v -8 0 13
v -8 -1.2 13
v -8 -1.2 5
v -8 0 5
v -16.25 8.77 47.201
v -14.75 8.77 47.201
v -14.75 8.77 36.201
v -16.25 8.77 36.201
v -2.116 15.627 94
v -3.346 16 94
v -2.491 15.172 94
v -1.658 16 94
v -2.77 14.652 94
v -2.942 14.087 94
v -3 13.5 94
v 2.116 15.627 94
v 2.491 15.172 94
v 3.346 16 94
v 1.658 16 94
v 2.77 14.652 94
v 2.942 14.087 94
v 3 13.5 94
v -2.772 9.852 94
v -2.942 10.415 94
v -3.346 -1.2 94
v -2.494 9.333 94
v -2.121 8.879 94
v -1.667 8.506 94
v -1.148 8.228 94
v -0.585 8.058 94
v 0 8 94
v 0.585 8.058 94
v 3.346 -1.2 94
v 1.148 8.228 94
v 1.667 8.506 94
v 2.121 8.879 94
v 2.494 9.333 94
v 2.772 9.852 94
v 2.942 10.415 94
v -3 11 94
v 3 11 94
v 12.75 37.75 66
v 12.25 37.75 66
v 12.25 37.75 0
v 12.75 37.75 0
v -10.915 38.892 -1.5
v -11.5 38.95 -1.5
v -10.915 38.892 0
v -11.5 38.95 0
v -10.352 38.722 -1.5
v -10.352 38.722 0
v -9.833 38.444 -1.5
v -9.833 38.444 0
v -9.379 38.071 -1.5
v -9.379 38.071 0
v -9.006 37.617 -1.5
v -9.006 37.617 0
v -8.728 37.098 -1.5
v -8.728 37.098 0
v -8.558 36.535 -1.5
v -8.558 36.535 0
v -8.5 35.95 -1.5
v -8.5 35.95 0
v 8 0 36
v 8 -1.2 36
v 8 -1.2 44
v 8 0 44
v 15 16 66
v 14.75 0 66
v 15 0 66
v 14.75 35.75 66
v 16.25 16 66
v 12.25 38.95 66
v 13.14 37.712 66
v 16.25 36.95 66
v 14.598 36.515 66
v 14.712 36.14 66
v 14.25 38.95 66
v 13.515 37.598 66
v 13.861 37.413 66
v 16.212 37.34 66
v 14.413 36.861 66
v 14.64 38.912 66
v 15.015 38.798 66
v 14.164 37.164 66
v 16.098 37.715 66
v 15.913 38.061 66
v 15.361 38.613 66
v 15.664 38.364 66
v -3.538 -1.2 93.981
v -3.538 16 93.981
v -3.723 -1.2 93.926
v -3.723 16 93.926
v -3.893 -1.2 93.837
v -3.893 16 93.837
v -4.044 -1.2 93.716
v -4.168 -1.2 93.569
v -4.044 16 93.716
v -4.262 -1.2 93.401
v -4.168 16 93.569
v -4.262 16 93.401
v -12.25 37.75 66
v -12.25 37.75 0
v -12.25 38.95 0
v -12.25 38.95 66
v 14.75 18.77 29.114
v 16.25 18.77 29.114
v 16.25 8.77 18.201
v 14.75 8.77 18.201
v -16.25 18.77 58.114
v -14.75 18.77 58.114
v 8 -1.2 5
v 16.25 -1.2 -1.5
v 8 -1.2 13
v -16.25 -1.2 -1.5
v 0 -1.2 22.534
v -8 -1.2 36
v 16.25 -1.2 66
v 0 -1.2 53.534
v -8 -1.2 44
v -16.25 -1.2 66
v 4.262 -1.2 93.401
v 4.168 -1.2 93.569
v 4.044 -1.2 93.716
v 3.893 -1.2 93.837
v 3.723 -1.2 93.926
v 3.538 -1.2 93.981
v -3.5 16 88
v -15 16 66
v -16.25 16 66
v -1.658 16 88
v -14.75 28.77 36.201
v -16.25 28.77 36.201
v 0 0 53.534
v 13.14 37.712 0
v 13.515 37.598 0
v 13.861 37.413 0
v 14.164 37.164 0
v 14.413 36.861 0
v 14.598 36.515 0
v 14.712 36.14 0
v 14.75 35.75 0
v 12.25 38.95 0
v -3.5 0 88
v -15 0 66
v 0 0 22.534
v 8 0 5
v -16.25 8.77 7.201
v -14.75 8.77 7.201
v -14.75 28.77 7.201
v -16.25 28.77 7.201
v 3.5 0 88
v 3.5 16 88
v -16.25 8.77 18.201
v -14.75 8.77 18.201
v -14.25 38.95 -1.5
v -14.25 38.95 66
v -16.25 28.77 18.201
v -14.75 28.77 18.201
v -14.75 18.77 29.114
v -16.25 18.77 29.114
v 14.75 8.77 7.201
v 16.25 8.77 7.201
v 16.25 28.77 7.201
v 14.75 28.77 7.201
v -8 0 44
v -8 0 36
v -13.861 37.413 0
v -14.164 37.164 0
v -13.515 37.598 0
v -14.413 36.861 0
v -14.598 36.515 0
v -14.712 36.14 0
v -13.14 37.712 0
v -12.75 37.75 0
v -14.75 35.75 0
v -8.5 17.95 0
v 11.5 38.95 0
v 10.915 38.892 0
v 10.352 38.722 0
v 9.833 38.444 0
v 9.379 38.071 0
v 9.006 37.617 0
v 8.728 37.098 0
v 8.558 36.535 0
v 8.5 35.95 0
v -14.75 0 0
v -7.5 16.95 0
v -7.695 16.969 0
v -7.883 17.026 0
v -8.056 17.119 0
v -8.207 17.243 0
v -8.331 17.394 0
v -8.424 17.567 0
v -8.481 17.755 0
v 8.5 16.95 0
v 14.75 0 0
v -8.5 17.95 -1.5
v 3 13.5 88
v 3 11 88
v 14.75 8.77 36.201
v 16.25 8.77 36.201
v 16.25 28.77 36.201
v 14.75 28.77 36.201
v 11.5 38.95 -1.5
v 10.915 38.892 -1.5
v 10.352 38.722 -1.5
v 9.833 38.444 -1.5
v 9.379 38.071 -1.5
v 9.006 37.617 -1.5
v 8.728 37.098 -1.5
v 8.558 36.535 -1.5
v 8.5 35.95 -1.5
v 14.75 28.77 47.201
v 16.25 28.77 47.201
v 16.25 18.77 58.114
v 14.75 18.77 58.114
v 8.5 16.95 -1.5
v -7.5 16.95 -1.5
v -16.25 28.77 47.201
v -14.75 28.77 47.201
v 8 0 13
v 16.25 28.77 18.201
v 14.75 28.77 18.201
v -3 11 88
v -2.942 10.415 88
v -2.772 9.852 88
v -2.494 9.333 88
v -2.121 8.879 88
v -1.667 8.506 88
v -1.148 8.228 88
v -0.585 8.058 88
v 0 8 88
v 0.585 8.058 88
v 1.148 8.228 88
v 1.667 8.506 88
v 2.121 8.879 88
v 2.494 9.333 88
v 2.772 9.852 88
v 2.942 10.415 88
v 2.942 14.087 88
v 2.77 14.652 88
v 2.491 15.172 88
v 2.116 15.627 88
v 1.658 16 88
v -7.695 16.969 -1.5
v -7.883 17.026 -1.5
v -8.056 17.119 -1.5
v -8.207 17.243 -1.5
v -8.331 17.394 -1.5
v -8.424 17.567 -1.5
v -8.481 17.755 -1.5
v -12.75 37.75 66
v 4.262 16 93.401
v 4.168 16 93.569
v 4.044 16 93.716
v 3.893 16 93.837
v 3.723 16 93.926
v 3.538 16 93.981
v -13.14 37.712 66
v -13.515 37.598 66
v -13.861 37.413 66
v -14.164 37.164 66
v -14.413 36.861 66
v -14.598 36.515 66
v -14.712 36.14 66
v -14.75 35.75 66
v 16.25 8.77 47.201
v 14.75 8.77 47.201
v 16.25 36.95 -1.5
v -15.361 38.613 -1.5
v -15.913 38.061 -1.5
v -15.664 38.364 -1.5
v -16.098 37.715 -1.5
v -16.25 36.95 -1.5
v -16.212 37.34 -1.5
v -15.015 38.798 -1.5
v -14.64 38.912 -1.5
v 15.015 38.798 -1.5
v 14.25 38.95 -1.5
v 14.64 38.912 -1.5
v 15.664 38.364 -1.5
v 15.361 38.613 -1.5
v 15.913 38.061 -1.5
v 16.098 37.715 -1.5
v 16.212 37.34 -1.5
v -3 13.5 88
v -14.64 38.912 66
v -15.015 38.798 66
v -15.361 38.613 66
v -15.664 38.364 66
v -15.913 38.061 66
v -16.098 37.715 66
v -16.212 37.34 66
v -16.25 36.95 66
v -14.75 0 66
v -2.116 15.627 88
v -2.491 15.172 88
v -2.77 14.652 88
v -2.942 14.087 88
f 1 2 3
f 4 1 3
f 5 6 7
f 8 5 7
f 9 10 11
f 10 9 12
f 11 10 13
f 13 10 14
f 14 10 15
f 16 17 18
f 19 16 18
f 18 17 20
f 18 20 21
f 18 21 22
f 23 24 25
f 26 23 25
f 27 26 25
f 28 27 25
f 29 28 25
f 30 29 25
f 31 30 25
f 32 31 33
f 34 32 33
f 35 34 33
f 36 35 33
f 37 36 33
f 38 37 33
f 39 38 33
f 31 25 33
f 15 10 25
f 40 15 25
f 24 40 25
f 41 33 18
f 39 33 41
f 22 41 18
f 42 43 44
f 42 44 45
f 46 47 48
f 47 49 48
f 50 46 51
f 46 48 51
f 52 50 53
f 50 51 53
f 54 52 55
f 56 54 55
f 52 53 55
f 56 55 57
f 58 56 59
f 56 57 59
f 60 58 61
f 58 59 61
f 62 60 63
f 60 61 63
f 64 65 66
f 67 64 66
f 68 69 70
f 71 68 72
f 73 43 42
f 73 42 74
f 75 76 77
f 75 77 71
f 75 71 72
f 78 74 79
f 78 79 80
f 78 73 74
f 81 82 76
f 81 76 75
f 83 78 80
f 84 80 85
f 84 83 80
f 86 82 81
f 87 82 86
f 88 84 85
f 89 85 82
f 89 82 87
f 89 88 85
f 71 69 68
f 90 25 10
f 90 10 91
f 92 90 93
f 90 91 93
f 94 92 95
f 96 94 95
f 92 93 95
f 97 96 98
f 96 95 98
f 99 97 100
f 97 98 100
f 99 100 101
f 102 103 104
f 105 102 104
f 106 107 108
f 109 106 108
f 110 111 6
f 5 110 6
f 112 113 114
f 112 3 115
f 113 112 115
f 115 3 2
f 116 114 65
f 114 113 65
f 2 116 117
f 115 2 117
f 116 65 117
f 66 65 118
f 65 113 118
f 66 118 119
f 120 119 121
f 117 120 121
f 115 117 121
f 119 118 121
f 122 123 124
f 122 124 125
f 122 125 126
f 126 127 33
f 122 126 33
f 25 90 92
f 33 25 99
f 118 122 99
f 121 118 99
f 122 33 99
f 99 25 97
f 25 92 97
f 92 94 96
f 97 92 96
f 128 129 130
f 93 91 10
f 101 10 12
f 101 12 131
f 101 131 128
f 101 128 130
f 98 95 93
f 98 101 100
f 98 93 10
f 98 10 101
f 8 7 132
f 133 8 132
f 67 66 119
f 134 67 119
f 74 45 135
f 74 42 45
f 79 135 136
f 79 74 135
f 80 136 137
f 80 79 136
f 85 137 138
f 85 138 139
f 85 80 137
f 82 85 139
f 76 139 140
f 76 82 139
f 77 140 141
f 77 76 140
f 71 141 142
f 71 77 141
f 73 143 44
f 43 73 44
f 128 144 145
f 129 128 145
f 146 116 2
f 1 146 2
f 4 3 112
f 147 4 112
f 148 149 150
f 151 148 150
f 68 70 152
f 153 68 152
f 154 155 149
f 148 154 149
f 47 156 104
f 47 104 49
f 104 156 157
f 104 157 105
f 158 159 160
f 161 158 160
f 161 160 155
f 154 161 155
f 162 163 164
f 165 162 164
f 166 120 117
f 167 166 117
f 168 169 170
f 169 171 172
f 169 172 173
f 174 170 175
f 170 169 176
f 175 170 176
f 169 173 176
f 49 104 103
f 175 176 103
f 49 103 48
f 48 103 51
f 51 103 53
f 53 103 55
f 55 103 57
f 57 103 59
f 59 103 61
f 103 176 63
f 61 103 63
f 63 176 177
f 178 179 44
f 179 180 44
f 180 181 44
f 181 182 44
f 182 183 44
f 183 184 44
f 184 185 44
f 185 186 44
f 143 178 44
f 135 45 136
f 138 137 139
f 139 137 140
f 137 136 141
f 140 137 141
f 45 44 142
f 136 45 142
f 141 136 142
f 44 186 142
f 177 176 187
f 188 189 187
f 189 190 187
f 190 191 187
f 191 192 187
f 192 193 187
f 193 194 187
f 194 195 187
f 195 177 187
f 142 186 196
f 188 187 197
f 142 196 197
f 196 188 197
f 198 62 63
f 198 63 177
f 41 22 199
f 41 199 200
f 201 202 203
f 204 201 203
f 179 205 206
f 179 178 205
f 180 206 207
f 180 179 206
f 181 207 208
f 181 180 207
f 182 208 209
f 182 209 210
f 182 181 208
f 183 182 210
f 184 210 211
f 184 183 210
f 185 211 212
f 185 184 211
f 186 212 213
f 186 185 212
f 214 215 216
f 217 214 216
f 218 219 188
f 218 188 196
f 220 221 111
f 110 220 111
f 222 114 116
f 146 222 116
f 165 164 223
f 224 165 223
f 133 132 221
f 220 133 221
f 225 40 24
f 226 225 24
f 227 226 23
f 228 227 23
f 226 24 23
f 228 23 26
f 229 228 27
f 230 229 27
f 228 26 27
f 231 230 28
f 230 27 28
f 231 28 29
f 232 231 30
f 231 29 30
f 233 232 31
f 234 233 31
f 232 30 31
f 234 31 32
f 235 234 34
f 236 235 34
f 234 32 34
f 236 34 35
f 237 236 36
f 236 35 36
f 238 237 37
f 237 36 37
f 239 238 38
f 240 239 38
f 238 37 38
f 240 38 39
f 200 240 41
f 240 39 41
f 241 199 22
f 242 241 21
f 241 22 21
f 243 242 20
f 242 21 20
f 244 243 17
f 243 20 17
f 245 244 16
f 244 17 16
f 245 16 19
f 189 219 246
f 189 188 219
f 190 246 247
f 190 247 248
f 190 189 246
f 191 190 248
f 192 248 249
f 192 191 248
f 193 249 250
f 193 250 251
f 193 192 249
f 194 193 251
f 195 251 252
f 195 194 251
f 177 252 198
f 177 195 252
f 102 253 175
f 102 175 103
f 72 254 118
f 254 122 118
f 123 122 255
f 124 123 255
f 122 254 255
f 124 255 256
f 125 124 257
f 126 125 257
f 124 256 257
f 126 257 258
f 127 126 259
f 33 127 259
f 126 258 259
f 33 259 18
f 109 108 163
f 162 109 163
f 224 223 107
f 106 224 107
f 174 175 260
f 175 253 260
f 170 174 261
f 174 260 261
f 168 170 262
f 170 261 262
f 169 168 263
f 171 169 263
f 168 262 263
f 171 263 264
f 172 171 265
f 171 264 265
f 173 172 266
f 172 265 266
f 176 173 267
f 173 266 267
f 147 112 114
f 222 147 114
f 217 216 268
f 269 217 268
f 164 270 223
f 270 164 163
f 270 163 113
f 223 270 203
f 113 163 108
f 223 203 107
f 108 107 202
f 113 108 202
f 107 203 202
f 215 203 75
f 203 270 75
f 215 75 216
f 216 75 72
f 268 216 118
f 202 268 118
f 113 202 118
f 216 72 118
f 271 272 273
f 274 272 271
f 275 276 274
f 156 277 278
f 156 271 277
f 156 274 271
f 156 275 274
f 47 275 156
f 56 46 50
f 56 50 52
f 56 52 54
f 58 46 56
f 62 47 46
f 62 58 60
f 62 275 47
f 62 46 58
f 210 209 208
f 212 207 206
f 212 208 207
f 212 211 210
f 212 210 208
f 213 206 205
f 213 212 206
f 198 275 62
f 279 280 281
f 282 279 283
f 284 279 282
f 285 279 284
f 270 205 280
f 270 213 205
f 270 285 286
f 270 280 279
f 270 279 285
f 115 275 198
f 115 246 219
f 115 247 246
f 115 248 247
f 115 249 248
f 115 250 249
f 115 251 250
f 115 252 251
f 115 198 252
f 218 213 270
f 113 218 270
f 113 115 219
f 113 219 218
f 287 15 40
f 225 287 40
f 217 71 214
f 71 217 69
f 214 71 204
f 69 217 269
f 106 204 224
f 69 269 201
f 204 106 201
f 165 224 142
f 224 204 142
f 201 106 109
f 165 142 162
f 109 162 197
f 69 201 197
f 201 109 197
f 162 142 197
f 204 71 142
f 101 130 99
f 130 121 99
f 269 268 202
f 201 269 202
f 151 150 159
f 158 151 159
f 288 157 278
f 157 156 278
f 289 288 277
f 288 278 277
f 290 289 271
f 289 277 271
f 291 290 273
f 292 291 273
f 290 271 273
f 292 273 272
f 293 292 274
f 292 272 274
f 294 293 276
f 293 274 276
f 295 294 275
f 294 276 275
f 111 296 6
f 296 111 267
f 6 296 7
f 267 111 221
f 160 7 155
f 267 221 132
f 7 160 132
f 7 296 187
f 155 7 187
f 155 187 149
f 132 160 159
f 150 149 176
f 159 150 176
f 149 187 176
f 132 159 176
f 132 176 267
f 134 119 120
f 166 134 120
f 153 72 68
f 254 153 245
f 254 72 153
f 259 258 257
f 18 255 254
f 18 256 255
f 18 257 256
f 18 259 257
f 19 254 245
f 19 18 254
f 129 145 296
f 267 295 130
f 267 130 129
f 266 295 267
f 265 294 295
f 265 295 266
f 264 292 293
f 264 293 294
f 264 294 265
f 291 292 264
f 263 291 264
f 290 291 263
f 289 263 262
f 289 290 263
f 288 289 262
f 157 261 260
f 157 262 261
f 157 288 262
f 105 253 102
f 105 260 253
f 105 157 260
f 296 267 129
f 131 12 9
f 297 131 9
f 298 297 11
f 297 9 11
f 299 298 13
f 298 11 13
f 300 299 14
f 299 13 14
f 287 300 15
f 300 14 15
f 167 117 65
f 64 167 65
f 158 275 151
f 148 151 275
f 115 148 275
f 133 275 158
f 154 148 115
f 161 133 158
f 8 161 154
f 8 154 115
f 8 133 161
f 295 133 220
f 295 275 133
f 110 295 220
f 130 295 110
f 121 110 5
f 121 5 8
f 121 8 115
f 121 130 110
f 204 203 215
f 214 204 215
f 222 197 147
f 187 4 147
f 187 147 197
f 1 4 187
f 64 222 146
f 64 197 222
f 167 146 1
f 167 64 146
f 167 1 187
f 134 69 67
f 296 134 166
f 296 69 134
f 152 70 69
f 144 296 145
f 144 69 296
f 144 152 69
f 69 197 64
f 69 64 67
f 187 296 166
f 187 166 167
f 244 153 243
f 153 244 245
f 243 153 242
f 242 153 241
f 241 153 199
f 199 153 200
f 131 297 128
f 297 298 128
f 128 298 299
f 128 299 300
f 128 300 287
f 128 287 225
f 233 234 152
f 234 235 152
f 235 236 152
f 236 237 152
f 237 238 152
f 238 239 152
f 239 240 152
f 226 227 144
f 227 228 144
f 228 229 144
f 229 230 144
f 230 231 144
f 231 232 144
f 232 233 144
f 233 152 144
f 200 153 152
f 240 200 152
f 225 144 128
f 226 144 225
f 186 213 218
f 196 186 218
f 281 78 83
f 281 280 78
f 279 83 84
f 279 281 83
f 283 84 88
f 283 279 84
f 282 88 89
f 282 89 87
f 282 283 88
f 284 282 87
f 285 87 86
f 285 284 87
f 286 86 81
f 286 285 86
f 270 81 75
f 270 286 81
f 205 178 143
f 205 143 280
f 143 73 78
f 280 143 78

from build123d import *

# Parameters (mm, degrees)
PAD_DEPTH              = 66
SKETCH001_W            = 32.5
SKETCH001_H            = 40.15
PAD001_DEPTH           = 1.5
PAD002_DEPTH           = 1.2
PAD003_DEPTH           = 16
SKETCH011_W            = 16.471436
SKETCH011_H            = 30.415474
POCKET_DEPTH           = 5
POCKET001_DEPTH        = 13
POCKET002_DEPTH        = 5
LINEARPATTERN_COUNT    = 2
LINEARPATTERN_PITCH    = 31
POCKET003_DEPTH        = 32.501
LINEARPATTERN001_COUNT = 2
LINEARPATTERN001_PITCH = 29
SKETCH017_W            = 17
SKETCH017_H            = 34.922093
POCKET004_DEPTH        = 5
FILLET_R               = 3
FILLET001_R            = 1
FILLET002_R            = 2
FILLET003_R            = 2
FILLET004_R            = 1
FILLET005_R            = 1


with BuildPart() as part:
    # Sketch → Pad (new body)
    with BuildSketch(Plane.XY):
        Polygon((14.75, 37.75), (14.75, 0), (-14.75, 0), (-14.75, 37.75), (-12.25, 37.75), (-12.25, 38.95), (-16.25, 38.95), (-16.25, -1.2), (16.25, -1.2), (16.25, 38.95), (12.25, 38.95), (12.25, 37.75), align=None)
    extrude(amount=PAD_DEPTH)

    # Sketch001 (on Face13 of Pad) → Pad001 (join)
    with BuildSketch(Plane(origin=(0, 0, 0), x_dir=(1, 0, 0), z_dir=(0, 0, -1))):
        with Locations((0, -18.875)):
            Rectangle(SKETCH001_W, SKETCH001_H)
    extrude(amount=PAD001_DEPTH)

    # Sketch002 (on Face13 of Pad001) → Pad002 (join)
    with BuildSketch(Plane.XZ.offset(1.2)):
        Polygon((-16.25, 66), (-4, 94), (4, 94), (16.25, 66), align=None)
    extrude(amount=-PAD002_DEPTH)

    # Sketch007 (on Face8 of Pad002) → Pad003 (join)
    with BuildSketch(Plane(origin=(0, 0, 0), x_dir=(-1, 0, 0), z_dir=(0, 1, 0))):
        Polygon((-16.25, 66), (-15, 66), (-3.5, 88), (3.5, 88), (15, 66), (16.25, 66), (4, 94), (-4, 94), align=None)
    extrude(amount=PAD003_DEPTH)

    # Sketch011 (on Face24 of Pad003) → Pocket (cut)
    with BuildSketch(Plane(origin=(37.87541, 0, 16.570492), x_dir=(0, 1, 0), z_dir=(0.916157, 0, 0.400819))):
        with Locations((0, -31.207737)):
            Rectangle(SKETCH011_W, SKETCH011_H)
    extrude(amount=-POCKET_DEPTH, mode=Mode.SUBTRACT)

    # Sketch016 (on Face27 of Pocket) → Pocket001 (cut)
    with BuildSketch(Plane.XY.offset(94)):
        with BuildLine():
            ThreePointArc((3, 13.5), (0, 16.5), (-3, 13.5))
            Line((-3, 13.5), (-3, 11))
            ThreePointArc((-3, 11), (0, 8), (3, 11))
            Line((3, 13.5), (3, 11))
        make_face()
    extrude(amount=-POCKET001_DEPTH, mode=Mode.SUBTRACT)

    # Sketch014 (on Face23 of Pocket001) → Pocket002 (cut)
    with BuildSketch(Plane.XZ.offset(1.2)):
        Polygon((0, 22.534029), (-8, 13), (-8, 5), (8, 5), (8, 13), align=None)
    pocket002 = extrude(amount=-POCKET002_DEPTH, mode=Mode.SUBTRACT)

    # LinearPattern: Pocket002 ×2
    with Locations(*[(0, 0, i * LINEARPATTERN_PITCH) for i in range(1, LINEARPATTERN_COUNT)]):
        add(pocket002, mode=Mode.SUBTRACT)

    # Sketch015 (on Face23 of LinearPattern) → Pocket003 (cut, through all)
    with BuildSketch(Plane.YZ.offset(16.25)):
        Polygon((18.770192, 29.113804), (8.770192, 18.200719), (8.770192, 7.200719), (28.770192, 7.200719), (28.770192, 18.200719), align=None)
    pocket003 = extrude(amount=-POCKET003_DEPTH, mode=Mode.SUBTRACT)

    # LinearPattern001: Pocket003 ×2
    with Locations(*[(0, 0, i * LINEARPATTERN001_PITCH) for i in range(1, LINEARPATTERN001_COUNT)]):
        add(pocket003, mode=Mode.SUBTRACT)

    # Sketch017 (on Face50 of LinearPattern001) → Pocket004 (cut)
    with BuildSketch(Plane(origin=(0, 0, -1.5), x_dir=(1, 0, 0), z_dir=(0, 0, -1))):
        with Locations((0, -34.411046)):
            Rectangle(SKETCH017_W, SKETCH017_H)
    extrude(amount=-POCKET004_DEPTH, mode=Mode.SUBTRACT)

    # Fillet
    fillet_edges = [part.edges().sort_by_distance(p)[0] for p in [
        (-8.5, 38.95, -0.75),
        (8.5, 38.95, -0.75),
    ]]
    fillet(fillet_edges, radius=FILLET_R)

    # Fillet001
    fillet001_edges = [part.edges().sort_by_distance(p)[0] for p in [
        (-8.5, 16.95, -0.75),
    ]]
    fillet(fillet001_edges, radius=FILLET001_R)

    # Fillet002
    fillet002_edges = [part.edges().sort_by_distance(p)[0] for p in [
        (-16.25, 38.95, 33),
        (16.25, 38.95, 33),
    ]]
    fillet(fillet002_edges, radius=FILLET002_R)

    # Fillet003
    fillet003_edges = [part.edges().sort_by_distance(p)[0] for p in [
        (-14.75, 37.75, 33),
        (14.75, 37.75, 33),
    ]]
    fillet(fillet003_edges, radius=FILLET003_R)

    # Fillet004
    fillet004_edges = [part.edges().sort_by_distance(p)[0] for p in [
        (4, 8, 94),
    ]]
    fillet(fillet004_edges, radius=FILLET004_R)

    # Fillet005
    fillet005_edges = [part.edges().sort_by_distance(p)[0] for p in [
        (-4, 8, 94),
    ]]
    fillet(fillet005_edges, radius=FILLET005_R)


solid = part.part
